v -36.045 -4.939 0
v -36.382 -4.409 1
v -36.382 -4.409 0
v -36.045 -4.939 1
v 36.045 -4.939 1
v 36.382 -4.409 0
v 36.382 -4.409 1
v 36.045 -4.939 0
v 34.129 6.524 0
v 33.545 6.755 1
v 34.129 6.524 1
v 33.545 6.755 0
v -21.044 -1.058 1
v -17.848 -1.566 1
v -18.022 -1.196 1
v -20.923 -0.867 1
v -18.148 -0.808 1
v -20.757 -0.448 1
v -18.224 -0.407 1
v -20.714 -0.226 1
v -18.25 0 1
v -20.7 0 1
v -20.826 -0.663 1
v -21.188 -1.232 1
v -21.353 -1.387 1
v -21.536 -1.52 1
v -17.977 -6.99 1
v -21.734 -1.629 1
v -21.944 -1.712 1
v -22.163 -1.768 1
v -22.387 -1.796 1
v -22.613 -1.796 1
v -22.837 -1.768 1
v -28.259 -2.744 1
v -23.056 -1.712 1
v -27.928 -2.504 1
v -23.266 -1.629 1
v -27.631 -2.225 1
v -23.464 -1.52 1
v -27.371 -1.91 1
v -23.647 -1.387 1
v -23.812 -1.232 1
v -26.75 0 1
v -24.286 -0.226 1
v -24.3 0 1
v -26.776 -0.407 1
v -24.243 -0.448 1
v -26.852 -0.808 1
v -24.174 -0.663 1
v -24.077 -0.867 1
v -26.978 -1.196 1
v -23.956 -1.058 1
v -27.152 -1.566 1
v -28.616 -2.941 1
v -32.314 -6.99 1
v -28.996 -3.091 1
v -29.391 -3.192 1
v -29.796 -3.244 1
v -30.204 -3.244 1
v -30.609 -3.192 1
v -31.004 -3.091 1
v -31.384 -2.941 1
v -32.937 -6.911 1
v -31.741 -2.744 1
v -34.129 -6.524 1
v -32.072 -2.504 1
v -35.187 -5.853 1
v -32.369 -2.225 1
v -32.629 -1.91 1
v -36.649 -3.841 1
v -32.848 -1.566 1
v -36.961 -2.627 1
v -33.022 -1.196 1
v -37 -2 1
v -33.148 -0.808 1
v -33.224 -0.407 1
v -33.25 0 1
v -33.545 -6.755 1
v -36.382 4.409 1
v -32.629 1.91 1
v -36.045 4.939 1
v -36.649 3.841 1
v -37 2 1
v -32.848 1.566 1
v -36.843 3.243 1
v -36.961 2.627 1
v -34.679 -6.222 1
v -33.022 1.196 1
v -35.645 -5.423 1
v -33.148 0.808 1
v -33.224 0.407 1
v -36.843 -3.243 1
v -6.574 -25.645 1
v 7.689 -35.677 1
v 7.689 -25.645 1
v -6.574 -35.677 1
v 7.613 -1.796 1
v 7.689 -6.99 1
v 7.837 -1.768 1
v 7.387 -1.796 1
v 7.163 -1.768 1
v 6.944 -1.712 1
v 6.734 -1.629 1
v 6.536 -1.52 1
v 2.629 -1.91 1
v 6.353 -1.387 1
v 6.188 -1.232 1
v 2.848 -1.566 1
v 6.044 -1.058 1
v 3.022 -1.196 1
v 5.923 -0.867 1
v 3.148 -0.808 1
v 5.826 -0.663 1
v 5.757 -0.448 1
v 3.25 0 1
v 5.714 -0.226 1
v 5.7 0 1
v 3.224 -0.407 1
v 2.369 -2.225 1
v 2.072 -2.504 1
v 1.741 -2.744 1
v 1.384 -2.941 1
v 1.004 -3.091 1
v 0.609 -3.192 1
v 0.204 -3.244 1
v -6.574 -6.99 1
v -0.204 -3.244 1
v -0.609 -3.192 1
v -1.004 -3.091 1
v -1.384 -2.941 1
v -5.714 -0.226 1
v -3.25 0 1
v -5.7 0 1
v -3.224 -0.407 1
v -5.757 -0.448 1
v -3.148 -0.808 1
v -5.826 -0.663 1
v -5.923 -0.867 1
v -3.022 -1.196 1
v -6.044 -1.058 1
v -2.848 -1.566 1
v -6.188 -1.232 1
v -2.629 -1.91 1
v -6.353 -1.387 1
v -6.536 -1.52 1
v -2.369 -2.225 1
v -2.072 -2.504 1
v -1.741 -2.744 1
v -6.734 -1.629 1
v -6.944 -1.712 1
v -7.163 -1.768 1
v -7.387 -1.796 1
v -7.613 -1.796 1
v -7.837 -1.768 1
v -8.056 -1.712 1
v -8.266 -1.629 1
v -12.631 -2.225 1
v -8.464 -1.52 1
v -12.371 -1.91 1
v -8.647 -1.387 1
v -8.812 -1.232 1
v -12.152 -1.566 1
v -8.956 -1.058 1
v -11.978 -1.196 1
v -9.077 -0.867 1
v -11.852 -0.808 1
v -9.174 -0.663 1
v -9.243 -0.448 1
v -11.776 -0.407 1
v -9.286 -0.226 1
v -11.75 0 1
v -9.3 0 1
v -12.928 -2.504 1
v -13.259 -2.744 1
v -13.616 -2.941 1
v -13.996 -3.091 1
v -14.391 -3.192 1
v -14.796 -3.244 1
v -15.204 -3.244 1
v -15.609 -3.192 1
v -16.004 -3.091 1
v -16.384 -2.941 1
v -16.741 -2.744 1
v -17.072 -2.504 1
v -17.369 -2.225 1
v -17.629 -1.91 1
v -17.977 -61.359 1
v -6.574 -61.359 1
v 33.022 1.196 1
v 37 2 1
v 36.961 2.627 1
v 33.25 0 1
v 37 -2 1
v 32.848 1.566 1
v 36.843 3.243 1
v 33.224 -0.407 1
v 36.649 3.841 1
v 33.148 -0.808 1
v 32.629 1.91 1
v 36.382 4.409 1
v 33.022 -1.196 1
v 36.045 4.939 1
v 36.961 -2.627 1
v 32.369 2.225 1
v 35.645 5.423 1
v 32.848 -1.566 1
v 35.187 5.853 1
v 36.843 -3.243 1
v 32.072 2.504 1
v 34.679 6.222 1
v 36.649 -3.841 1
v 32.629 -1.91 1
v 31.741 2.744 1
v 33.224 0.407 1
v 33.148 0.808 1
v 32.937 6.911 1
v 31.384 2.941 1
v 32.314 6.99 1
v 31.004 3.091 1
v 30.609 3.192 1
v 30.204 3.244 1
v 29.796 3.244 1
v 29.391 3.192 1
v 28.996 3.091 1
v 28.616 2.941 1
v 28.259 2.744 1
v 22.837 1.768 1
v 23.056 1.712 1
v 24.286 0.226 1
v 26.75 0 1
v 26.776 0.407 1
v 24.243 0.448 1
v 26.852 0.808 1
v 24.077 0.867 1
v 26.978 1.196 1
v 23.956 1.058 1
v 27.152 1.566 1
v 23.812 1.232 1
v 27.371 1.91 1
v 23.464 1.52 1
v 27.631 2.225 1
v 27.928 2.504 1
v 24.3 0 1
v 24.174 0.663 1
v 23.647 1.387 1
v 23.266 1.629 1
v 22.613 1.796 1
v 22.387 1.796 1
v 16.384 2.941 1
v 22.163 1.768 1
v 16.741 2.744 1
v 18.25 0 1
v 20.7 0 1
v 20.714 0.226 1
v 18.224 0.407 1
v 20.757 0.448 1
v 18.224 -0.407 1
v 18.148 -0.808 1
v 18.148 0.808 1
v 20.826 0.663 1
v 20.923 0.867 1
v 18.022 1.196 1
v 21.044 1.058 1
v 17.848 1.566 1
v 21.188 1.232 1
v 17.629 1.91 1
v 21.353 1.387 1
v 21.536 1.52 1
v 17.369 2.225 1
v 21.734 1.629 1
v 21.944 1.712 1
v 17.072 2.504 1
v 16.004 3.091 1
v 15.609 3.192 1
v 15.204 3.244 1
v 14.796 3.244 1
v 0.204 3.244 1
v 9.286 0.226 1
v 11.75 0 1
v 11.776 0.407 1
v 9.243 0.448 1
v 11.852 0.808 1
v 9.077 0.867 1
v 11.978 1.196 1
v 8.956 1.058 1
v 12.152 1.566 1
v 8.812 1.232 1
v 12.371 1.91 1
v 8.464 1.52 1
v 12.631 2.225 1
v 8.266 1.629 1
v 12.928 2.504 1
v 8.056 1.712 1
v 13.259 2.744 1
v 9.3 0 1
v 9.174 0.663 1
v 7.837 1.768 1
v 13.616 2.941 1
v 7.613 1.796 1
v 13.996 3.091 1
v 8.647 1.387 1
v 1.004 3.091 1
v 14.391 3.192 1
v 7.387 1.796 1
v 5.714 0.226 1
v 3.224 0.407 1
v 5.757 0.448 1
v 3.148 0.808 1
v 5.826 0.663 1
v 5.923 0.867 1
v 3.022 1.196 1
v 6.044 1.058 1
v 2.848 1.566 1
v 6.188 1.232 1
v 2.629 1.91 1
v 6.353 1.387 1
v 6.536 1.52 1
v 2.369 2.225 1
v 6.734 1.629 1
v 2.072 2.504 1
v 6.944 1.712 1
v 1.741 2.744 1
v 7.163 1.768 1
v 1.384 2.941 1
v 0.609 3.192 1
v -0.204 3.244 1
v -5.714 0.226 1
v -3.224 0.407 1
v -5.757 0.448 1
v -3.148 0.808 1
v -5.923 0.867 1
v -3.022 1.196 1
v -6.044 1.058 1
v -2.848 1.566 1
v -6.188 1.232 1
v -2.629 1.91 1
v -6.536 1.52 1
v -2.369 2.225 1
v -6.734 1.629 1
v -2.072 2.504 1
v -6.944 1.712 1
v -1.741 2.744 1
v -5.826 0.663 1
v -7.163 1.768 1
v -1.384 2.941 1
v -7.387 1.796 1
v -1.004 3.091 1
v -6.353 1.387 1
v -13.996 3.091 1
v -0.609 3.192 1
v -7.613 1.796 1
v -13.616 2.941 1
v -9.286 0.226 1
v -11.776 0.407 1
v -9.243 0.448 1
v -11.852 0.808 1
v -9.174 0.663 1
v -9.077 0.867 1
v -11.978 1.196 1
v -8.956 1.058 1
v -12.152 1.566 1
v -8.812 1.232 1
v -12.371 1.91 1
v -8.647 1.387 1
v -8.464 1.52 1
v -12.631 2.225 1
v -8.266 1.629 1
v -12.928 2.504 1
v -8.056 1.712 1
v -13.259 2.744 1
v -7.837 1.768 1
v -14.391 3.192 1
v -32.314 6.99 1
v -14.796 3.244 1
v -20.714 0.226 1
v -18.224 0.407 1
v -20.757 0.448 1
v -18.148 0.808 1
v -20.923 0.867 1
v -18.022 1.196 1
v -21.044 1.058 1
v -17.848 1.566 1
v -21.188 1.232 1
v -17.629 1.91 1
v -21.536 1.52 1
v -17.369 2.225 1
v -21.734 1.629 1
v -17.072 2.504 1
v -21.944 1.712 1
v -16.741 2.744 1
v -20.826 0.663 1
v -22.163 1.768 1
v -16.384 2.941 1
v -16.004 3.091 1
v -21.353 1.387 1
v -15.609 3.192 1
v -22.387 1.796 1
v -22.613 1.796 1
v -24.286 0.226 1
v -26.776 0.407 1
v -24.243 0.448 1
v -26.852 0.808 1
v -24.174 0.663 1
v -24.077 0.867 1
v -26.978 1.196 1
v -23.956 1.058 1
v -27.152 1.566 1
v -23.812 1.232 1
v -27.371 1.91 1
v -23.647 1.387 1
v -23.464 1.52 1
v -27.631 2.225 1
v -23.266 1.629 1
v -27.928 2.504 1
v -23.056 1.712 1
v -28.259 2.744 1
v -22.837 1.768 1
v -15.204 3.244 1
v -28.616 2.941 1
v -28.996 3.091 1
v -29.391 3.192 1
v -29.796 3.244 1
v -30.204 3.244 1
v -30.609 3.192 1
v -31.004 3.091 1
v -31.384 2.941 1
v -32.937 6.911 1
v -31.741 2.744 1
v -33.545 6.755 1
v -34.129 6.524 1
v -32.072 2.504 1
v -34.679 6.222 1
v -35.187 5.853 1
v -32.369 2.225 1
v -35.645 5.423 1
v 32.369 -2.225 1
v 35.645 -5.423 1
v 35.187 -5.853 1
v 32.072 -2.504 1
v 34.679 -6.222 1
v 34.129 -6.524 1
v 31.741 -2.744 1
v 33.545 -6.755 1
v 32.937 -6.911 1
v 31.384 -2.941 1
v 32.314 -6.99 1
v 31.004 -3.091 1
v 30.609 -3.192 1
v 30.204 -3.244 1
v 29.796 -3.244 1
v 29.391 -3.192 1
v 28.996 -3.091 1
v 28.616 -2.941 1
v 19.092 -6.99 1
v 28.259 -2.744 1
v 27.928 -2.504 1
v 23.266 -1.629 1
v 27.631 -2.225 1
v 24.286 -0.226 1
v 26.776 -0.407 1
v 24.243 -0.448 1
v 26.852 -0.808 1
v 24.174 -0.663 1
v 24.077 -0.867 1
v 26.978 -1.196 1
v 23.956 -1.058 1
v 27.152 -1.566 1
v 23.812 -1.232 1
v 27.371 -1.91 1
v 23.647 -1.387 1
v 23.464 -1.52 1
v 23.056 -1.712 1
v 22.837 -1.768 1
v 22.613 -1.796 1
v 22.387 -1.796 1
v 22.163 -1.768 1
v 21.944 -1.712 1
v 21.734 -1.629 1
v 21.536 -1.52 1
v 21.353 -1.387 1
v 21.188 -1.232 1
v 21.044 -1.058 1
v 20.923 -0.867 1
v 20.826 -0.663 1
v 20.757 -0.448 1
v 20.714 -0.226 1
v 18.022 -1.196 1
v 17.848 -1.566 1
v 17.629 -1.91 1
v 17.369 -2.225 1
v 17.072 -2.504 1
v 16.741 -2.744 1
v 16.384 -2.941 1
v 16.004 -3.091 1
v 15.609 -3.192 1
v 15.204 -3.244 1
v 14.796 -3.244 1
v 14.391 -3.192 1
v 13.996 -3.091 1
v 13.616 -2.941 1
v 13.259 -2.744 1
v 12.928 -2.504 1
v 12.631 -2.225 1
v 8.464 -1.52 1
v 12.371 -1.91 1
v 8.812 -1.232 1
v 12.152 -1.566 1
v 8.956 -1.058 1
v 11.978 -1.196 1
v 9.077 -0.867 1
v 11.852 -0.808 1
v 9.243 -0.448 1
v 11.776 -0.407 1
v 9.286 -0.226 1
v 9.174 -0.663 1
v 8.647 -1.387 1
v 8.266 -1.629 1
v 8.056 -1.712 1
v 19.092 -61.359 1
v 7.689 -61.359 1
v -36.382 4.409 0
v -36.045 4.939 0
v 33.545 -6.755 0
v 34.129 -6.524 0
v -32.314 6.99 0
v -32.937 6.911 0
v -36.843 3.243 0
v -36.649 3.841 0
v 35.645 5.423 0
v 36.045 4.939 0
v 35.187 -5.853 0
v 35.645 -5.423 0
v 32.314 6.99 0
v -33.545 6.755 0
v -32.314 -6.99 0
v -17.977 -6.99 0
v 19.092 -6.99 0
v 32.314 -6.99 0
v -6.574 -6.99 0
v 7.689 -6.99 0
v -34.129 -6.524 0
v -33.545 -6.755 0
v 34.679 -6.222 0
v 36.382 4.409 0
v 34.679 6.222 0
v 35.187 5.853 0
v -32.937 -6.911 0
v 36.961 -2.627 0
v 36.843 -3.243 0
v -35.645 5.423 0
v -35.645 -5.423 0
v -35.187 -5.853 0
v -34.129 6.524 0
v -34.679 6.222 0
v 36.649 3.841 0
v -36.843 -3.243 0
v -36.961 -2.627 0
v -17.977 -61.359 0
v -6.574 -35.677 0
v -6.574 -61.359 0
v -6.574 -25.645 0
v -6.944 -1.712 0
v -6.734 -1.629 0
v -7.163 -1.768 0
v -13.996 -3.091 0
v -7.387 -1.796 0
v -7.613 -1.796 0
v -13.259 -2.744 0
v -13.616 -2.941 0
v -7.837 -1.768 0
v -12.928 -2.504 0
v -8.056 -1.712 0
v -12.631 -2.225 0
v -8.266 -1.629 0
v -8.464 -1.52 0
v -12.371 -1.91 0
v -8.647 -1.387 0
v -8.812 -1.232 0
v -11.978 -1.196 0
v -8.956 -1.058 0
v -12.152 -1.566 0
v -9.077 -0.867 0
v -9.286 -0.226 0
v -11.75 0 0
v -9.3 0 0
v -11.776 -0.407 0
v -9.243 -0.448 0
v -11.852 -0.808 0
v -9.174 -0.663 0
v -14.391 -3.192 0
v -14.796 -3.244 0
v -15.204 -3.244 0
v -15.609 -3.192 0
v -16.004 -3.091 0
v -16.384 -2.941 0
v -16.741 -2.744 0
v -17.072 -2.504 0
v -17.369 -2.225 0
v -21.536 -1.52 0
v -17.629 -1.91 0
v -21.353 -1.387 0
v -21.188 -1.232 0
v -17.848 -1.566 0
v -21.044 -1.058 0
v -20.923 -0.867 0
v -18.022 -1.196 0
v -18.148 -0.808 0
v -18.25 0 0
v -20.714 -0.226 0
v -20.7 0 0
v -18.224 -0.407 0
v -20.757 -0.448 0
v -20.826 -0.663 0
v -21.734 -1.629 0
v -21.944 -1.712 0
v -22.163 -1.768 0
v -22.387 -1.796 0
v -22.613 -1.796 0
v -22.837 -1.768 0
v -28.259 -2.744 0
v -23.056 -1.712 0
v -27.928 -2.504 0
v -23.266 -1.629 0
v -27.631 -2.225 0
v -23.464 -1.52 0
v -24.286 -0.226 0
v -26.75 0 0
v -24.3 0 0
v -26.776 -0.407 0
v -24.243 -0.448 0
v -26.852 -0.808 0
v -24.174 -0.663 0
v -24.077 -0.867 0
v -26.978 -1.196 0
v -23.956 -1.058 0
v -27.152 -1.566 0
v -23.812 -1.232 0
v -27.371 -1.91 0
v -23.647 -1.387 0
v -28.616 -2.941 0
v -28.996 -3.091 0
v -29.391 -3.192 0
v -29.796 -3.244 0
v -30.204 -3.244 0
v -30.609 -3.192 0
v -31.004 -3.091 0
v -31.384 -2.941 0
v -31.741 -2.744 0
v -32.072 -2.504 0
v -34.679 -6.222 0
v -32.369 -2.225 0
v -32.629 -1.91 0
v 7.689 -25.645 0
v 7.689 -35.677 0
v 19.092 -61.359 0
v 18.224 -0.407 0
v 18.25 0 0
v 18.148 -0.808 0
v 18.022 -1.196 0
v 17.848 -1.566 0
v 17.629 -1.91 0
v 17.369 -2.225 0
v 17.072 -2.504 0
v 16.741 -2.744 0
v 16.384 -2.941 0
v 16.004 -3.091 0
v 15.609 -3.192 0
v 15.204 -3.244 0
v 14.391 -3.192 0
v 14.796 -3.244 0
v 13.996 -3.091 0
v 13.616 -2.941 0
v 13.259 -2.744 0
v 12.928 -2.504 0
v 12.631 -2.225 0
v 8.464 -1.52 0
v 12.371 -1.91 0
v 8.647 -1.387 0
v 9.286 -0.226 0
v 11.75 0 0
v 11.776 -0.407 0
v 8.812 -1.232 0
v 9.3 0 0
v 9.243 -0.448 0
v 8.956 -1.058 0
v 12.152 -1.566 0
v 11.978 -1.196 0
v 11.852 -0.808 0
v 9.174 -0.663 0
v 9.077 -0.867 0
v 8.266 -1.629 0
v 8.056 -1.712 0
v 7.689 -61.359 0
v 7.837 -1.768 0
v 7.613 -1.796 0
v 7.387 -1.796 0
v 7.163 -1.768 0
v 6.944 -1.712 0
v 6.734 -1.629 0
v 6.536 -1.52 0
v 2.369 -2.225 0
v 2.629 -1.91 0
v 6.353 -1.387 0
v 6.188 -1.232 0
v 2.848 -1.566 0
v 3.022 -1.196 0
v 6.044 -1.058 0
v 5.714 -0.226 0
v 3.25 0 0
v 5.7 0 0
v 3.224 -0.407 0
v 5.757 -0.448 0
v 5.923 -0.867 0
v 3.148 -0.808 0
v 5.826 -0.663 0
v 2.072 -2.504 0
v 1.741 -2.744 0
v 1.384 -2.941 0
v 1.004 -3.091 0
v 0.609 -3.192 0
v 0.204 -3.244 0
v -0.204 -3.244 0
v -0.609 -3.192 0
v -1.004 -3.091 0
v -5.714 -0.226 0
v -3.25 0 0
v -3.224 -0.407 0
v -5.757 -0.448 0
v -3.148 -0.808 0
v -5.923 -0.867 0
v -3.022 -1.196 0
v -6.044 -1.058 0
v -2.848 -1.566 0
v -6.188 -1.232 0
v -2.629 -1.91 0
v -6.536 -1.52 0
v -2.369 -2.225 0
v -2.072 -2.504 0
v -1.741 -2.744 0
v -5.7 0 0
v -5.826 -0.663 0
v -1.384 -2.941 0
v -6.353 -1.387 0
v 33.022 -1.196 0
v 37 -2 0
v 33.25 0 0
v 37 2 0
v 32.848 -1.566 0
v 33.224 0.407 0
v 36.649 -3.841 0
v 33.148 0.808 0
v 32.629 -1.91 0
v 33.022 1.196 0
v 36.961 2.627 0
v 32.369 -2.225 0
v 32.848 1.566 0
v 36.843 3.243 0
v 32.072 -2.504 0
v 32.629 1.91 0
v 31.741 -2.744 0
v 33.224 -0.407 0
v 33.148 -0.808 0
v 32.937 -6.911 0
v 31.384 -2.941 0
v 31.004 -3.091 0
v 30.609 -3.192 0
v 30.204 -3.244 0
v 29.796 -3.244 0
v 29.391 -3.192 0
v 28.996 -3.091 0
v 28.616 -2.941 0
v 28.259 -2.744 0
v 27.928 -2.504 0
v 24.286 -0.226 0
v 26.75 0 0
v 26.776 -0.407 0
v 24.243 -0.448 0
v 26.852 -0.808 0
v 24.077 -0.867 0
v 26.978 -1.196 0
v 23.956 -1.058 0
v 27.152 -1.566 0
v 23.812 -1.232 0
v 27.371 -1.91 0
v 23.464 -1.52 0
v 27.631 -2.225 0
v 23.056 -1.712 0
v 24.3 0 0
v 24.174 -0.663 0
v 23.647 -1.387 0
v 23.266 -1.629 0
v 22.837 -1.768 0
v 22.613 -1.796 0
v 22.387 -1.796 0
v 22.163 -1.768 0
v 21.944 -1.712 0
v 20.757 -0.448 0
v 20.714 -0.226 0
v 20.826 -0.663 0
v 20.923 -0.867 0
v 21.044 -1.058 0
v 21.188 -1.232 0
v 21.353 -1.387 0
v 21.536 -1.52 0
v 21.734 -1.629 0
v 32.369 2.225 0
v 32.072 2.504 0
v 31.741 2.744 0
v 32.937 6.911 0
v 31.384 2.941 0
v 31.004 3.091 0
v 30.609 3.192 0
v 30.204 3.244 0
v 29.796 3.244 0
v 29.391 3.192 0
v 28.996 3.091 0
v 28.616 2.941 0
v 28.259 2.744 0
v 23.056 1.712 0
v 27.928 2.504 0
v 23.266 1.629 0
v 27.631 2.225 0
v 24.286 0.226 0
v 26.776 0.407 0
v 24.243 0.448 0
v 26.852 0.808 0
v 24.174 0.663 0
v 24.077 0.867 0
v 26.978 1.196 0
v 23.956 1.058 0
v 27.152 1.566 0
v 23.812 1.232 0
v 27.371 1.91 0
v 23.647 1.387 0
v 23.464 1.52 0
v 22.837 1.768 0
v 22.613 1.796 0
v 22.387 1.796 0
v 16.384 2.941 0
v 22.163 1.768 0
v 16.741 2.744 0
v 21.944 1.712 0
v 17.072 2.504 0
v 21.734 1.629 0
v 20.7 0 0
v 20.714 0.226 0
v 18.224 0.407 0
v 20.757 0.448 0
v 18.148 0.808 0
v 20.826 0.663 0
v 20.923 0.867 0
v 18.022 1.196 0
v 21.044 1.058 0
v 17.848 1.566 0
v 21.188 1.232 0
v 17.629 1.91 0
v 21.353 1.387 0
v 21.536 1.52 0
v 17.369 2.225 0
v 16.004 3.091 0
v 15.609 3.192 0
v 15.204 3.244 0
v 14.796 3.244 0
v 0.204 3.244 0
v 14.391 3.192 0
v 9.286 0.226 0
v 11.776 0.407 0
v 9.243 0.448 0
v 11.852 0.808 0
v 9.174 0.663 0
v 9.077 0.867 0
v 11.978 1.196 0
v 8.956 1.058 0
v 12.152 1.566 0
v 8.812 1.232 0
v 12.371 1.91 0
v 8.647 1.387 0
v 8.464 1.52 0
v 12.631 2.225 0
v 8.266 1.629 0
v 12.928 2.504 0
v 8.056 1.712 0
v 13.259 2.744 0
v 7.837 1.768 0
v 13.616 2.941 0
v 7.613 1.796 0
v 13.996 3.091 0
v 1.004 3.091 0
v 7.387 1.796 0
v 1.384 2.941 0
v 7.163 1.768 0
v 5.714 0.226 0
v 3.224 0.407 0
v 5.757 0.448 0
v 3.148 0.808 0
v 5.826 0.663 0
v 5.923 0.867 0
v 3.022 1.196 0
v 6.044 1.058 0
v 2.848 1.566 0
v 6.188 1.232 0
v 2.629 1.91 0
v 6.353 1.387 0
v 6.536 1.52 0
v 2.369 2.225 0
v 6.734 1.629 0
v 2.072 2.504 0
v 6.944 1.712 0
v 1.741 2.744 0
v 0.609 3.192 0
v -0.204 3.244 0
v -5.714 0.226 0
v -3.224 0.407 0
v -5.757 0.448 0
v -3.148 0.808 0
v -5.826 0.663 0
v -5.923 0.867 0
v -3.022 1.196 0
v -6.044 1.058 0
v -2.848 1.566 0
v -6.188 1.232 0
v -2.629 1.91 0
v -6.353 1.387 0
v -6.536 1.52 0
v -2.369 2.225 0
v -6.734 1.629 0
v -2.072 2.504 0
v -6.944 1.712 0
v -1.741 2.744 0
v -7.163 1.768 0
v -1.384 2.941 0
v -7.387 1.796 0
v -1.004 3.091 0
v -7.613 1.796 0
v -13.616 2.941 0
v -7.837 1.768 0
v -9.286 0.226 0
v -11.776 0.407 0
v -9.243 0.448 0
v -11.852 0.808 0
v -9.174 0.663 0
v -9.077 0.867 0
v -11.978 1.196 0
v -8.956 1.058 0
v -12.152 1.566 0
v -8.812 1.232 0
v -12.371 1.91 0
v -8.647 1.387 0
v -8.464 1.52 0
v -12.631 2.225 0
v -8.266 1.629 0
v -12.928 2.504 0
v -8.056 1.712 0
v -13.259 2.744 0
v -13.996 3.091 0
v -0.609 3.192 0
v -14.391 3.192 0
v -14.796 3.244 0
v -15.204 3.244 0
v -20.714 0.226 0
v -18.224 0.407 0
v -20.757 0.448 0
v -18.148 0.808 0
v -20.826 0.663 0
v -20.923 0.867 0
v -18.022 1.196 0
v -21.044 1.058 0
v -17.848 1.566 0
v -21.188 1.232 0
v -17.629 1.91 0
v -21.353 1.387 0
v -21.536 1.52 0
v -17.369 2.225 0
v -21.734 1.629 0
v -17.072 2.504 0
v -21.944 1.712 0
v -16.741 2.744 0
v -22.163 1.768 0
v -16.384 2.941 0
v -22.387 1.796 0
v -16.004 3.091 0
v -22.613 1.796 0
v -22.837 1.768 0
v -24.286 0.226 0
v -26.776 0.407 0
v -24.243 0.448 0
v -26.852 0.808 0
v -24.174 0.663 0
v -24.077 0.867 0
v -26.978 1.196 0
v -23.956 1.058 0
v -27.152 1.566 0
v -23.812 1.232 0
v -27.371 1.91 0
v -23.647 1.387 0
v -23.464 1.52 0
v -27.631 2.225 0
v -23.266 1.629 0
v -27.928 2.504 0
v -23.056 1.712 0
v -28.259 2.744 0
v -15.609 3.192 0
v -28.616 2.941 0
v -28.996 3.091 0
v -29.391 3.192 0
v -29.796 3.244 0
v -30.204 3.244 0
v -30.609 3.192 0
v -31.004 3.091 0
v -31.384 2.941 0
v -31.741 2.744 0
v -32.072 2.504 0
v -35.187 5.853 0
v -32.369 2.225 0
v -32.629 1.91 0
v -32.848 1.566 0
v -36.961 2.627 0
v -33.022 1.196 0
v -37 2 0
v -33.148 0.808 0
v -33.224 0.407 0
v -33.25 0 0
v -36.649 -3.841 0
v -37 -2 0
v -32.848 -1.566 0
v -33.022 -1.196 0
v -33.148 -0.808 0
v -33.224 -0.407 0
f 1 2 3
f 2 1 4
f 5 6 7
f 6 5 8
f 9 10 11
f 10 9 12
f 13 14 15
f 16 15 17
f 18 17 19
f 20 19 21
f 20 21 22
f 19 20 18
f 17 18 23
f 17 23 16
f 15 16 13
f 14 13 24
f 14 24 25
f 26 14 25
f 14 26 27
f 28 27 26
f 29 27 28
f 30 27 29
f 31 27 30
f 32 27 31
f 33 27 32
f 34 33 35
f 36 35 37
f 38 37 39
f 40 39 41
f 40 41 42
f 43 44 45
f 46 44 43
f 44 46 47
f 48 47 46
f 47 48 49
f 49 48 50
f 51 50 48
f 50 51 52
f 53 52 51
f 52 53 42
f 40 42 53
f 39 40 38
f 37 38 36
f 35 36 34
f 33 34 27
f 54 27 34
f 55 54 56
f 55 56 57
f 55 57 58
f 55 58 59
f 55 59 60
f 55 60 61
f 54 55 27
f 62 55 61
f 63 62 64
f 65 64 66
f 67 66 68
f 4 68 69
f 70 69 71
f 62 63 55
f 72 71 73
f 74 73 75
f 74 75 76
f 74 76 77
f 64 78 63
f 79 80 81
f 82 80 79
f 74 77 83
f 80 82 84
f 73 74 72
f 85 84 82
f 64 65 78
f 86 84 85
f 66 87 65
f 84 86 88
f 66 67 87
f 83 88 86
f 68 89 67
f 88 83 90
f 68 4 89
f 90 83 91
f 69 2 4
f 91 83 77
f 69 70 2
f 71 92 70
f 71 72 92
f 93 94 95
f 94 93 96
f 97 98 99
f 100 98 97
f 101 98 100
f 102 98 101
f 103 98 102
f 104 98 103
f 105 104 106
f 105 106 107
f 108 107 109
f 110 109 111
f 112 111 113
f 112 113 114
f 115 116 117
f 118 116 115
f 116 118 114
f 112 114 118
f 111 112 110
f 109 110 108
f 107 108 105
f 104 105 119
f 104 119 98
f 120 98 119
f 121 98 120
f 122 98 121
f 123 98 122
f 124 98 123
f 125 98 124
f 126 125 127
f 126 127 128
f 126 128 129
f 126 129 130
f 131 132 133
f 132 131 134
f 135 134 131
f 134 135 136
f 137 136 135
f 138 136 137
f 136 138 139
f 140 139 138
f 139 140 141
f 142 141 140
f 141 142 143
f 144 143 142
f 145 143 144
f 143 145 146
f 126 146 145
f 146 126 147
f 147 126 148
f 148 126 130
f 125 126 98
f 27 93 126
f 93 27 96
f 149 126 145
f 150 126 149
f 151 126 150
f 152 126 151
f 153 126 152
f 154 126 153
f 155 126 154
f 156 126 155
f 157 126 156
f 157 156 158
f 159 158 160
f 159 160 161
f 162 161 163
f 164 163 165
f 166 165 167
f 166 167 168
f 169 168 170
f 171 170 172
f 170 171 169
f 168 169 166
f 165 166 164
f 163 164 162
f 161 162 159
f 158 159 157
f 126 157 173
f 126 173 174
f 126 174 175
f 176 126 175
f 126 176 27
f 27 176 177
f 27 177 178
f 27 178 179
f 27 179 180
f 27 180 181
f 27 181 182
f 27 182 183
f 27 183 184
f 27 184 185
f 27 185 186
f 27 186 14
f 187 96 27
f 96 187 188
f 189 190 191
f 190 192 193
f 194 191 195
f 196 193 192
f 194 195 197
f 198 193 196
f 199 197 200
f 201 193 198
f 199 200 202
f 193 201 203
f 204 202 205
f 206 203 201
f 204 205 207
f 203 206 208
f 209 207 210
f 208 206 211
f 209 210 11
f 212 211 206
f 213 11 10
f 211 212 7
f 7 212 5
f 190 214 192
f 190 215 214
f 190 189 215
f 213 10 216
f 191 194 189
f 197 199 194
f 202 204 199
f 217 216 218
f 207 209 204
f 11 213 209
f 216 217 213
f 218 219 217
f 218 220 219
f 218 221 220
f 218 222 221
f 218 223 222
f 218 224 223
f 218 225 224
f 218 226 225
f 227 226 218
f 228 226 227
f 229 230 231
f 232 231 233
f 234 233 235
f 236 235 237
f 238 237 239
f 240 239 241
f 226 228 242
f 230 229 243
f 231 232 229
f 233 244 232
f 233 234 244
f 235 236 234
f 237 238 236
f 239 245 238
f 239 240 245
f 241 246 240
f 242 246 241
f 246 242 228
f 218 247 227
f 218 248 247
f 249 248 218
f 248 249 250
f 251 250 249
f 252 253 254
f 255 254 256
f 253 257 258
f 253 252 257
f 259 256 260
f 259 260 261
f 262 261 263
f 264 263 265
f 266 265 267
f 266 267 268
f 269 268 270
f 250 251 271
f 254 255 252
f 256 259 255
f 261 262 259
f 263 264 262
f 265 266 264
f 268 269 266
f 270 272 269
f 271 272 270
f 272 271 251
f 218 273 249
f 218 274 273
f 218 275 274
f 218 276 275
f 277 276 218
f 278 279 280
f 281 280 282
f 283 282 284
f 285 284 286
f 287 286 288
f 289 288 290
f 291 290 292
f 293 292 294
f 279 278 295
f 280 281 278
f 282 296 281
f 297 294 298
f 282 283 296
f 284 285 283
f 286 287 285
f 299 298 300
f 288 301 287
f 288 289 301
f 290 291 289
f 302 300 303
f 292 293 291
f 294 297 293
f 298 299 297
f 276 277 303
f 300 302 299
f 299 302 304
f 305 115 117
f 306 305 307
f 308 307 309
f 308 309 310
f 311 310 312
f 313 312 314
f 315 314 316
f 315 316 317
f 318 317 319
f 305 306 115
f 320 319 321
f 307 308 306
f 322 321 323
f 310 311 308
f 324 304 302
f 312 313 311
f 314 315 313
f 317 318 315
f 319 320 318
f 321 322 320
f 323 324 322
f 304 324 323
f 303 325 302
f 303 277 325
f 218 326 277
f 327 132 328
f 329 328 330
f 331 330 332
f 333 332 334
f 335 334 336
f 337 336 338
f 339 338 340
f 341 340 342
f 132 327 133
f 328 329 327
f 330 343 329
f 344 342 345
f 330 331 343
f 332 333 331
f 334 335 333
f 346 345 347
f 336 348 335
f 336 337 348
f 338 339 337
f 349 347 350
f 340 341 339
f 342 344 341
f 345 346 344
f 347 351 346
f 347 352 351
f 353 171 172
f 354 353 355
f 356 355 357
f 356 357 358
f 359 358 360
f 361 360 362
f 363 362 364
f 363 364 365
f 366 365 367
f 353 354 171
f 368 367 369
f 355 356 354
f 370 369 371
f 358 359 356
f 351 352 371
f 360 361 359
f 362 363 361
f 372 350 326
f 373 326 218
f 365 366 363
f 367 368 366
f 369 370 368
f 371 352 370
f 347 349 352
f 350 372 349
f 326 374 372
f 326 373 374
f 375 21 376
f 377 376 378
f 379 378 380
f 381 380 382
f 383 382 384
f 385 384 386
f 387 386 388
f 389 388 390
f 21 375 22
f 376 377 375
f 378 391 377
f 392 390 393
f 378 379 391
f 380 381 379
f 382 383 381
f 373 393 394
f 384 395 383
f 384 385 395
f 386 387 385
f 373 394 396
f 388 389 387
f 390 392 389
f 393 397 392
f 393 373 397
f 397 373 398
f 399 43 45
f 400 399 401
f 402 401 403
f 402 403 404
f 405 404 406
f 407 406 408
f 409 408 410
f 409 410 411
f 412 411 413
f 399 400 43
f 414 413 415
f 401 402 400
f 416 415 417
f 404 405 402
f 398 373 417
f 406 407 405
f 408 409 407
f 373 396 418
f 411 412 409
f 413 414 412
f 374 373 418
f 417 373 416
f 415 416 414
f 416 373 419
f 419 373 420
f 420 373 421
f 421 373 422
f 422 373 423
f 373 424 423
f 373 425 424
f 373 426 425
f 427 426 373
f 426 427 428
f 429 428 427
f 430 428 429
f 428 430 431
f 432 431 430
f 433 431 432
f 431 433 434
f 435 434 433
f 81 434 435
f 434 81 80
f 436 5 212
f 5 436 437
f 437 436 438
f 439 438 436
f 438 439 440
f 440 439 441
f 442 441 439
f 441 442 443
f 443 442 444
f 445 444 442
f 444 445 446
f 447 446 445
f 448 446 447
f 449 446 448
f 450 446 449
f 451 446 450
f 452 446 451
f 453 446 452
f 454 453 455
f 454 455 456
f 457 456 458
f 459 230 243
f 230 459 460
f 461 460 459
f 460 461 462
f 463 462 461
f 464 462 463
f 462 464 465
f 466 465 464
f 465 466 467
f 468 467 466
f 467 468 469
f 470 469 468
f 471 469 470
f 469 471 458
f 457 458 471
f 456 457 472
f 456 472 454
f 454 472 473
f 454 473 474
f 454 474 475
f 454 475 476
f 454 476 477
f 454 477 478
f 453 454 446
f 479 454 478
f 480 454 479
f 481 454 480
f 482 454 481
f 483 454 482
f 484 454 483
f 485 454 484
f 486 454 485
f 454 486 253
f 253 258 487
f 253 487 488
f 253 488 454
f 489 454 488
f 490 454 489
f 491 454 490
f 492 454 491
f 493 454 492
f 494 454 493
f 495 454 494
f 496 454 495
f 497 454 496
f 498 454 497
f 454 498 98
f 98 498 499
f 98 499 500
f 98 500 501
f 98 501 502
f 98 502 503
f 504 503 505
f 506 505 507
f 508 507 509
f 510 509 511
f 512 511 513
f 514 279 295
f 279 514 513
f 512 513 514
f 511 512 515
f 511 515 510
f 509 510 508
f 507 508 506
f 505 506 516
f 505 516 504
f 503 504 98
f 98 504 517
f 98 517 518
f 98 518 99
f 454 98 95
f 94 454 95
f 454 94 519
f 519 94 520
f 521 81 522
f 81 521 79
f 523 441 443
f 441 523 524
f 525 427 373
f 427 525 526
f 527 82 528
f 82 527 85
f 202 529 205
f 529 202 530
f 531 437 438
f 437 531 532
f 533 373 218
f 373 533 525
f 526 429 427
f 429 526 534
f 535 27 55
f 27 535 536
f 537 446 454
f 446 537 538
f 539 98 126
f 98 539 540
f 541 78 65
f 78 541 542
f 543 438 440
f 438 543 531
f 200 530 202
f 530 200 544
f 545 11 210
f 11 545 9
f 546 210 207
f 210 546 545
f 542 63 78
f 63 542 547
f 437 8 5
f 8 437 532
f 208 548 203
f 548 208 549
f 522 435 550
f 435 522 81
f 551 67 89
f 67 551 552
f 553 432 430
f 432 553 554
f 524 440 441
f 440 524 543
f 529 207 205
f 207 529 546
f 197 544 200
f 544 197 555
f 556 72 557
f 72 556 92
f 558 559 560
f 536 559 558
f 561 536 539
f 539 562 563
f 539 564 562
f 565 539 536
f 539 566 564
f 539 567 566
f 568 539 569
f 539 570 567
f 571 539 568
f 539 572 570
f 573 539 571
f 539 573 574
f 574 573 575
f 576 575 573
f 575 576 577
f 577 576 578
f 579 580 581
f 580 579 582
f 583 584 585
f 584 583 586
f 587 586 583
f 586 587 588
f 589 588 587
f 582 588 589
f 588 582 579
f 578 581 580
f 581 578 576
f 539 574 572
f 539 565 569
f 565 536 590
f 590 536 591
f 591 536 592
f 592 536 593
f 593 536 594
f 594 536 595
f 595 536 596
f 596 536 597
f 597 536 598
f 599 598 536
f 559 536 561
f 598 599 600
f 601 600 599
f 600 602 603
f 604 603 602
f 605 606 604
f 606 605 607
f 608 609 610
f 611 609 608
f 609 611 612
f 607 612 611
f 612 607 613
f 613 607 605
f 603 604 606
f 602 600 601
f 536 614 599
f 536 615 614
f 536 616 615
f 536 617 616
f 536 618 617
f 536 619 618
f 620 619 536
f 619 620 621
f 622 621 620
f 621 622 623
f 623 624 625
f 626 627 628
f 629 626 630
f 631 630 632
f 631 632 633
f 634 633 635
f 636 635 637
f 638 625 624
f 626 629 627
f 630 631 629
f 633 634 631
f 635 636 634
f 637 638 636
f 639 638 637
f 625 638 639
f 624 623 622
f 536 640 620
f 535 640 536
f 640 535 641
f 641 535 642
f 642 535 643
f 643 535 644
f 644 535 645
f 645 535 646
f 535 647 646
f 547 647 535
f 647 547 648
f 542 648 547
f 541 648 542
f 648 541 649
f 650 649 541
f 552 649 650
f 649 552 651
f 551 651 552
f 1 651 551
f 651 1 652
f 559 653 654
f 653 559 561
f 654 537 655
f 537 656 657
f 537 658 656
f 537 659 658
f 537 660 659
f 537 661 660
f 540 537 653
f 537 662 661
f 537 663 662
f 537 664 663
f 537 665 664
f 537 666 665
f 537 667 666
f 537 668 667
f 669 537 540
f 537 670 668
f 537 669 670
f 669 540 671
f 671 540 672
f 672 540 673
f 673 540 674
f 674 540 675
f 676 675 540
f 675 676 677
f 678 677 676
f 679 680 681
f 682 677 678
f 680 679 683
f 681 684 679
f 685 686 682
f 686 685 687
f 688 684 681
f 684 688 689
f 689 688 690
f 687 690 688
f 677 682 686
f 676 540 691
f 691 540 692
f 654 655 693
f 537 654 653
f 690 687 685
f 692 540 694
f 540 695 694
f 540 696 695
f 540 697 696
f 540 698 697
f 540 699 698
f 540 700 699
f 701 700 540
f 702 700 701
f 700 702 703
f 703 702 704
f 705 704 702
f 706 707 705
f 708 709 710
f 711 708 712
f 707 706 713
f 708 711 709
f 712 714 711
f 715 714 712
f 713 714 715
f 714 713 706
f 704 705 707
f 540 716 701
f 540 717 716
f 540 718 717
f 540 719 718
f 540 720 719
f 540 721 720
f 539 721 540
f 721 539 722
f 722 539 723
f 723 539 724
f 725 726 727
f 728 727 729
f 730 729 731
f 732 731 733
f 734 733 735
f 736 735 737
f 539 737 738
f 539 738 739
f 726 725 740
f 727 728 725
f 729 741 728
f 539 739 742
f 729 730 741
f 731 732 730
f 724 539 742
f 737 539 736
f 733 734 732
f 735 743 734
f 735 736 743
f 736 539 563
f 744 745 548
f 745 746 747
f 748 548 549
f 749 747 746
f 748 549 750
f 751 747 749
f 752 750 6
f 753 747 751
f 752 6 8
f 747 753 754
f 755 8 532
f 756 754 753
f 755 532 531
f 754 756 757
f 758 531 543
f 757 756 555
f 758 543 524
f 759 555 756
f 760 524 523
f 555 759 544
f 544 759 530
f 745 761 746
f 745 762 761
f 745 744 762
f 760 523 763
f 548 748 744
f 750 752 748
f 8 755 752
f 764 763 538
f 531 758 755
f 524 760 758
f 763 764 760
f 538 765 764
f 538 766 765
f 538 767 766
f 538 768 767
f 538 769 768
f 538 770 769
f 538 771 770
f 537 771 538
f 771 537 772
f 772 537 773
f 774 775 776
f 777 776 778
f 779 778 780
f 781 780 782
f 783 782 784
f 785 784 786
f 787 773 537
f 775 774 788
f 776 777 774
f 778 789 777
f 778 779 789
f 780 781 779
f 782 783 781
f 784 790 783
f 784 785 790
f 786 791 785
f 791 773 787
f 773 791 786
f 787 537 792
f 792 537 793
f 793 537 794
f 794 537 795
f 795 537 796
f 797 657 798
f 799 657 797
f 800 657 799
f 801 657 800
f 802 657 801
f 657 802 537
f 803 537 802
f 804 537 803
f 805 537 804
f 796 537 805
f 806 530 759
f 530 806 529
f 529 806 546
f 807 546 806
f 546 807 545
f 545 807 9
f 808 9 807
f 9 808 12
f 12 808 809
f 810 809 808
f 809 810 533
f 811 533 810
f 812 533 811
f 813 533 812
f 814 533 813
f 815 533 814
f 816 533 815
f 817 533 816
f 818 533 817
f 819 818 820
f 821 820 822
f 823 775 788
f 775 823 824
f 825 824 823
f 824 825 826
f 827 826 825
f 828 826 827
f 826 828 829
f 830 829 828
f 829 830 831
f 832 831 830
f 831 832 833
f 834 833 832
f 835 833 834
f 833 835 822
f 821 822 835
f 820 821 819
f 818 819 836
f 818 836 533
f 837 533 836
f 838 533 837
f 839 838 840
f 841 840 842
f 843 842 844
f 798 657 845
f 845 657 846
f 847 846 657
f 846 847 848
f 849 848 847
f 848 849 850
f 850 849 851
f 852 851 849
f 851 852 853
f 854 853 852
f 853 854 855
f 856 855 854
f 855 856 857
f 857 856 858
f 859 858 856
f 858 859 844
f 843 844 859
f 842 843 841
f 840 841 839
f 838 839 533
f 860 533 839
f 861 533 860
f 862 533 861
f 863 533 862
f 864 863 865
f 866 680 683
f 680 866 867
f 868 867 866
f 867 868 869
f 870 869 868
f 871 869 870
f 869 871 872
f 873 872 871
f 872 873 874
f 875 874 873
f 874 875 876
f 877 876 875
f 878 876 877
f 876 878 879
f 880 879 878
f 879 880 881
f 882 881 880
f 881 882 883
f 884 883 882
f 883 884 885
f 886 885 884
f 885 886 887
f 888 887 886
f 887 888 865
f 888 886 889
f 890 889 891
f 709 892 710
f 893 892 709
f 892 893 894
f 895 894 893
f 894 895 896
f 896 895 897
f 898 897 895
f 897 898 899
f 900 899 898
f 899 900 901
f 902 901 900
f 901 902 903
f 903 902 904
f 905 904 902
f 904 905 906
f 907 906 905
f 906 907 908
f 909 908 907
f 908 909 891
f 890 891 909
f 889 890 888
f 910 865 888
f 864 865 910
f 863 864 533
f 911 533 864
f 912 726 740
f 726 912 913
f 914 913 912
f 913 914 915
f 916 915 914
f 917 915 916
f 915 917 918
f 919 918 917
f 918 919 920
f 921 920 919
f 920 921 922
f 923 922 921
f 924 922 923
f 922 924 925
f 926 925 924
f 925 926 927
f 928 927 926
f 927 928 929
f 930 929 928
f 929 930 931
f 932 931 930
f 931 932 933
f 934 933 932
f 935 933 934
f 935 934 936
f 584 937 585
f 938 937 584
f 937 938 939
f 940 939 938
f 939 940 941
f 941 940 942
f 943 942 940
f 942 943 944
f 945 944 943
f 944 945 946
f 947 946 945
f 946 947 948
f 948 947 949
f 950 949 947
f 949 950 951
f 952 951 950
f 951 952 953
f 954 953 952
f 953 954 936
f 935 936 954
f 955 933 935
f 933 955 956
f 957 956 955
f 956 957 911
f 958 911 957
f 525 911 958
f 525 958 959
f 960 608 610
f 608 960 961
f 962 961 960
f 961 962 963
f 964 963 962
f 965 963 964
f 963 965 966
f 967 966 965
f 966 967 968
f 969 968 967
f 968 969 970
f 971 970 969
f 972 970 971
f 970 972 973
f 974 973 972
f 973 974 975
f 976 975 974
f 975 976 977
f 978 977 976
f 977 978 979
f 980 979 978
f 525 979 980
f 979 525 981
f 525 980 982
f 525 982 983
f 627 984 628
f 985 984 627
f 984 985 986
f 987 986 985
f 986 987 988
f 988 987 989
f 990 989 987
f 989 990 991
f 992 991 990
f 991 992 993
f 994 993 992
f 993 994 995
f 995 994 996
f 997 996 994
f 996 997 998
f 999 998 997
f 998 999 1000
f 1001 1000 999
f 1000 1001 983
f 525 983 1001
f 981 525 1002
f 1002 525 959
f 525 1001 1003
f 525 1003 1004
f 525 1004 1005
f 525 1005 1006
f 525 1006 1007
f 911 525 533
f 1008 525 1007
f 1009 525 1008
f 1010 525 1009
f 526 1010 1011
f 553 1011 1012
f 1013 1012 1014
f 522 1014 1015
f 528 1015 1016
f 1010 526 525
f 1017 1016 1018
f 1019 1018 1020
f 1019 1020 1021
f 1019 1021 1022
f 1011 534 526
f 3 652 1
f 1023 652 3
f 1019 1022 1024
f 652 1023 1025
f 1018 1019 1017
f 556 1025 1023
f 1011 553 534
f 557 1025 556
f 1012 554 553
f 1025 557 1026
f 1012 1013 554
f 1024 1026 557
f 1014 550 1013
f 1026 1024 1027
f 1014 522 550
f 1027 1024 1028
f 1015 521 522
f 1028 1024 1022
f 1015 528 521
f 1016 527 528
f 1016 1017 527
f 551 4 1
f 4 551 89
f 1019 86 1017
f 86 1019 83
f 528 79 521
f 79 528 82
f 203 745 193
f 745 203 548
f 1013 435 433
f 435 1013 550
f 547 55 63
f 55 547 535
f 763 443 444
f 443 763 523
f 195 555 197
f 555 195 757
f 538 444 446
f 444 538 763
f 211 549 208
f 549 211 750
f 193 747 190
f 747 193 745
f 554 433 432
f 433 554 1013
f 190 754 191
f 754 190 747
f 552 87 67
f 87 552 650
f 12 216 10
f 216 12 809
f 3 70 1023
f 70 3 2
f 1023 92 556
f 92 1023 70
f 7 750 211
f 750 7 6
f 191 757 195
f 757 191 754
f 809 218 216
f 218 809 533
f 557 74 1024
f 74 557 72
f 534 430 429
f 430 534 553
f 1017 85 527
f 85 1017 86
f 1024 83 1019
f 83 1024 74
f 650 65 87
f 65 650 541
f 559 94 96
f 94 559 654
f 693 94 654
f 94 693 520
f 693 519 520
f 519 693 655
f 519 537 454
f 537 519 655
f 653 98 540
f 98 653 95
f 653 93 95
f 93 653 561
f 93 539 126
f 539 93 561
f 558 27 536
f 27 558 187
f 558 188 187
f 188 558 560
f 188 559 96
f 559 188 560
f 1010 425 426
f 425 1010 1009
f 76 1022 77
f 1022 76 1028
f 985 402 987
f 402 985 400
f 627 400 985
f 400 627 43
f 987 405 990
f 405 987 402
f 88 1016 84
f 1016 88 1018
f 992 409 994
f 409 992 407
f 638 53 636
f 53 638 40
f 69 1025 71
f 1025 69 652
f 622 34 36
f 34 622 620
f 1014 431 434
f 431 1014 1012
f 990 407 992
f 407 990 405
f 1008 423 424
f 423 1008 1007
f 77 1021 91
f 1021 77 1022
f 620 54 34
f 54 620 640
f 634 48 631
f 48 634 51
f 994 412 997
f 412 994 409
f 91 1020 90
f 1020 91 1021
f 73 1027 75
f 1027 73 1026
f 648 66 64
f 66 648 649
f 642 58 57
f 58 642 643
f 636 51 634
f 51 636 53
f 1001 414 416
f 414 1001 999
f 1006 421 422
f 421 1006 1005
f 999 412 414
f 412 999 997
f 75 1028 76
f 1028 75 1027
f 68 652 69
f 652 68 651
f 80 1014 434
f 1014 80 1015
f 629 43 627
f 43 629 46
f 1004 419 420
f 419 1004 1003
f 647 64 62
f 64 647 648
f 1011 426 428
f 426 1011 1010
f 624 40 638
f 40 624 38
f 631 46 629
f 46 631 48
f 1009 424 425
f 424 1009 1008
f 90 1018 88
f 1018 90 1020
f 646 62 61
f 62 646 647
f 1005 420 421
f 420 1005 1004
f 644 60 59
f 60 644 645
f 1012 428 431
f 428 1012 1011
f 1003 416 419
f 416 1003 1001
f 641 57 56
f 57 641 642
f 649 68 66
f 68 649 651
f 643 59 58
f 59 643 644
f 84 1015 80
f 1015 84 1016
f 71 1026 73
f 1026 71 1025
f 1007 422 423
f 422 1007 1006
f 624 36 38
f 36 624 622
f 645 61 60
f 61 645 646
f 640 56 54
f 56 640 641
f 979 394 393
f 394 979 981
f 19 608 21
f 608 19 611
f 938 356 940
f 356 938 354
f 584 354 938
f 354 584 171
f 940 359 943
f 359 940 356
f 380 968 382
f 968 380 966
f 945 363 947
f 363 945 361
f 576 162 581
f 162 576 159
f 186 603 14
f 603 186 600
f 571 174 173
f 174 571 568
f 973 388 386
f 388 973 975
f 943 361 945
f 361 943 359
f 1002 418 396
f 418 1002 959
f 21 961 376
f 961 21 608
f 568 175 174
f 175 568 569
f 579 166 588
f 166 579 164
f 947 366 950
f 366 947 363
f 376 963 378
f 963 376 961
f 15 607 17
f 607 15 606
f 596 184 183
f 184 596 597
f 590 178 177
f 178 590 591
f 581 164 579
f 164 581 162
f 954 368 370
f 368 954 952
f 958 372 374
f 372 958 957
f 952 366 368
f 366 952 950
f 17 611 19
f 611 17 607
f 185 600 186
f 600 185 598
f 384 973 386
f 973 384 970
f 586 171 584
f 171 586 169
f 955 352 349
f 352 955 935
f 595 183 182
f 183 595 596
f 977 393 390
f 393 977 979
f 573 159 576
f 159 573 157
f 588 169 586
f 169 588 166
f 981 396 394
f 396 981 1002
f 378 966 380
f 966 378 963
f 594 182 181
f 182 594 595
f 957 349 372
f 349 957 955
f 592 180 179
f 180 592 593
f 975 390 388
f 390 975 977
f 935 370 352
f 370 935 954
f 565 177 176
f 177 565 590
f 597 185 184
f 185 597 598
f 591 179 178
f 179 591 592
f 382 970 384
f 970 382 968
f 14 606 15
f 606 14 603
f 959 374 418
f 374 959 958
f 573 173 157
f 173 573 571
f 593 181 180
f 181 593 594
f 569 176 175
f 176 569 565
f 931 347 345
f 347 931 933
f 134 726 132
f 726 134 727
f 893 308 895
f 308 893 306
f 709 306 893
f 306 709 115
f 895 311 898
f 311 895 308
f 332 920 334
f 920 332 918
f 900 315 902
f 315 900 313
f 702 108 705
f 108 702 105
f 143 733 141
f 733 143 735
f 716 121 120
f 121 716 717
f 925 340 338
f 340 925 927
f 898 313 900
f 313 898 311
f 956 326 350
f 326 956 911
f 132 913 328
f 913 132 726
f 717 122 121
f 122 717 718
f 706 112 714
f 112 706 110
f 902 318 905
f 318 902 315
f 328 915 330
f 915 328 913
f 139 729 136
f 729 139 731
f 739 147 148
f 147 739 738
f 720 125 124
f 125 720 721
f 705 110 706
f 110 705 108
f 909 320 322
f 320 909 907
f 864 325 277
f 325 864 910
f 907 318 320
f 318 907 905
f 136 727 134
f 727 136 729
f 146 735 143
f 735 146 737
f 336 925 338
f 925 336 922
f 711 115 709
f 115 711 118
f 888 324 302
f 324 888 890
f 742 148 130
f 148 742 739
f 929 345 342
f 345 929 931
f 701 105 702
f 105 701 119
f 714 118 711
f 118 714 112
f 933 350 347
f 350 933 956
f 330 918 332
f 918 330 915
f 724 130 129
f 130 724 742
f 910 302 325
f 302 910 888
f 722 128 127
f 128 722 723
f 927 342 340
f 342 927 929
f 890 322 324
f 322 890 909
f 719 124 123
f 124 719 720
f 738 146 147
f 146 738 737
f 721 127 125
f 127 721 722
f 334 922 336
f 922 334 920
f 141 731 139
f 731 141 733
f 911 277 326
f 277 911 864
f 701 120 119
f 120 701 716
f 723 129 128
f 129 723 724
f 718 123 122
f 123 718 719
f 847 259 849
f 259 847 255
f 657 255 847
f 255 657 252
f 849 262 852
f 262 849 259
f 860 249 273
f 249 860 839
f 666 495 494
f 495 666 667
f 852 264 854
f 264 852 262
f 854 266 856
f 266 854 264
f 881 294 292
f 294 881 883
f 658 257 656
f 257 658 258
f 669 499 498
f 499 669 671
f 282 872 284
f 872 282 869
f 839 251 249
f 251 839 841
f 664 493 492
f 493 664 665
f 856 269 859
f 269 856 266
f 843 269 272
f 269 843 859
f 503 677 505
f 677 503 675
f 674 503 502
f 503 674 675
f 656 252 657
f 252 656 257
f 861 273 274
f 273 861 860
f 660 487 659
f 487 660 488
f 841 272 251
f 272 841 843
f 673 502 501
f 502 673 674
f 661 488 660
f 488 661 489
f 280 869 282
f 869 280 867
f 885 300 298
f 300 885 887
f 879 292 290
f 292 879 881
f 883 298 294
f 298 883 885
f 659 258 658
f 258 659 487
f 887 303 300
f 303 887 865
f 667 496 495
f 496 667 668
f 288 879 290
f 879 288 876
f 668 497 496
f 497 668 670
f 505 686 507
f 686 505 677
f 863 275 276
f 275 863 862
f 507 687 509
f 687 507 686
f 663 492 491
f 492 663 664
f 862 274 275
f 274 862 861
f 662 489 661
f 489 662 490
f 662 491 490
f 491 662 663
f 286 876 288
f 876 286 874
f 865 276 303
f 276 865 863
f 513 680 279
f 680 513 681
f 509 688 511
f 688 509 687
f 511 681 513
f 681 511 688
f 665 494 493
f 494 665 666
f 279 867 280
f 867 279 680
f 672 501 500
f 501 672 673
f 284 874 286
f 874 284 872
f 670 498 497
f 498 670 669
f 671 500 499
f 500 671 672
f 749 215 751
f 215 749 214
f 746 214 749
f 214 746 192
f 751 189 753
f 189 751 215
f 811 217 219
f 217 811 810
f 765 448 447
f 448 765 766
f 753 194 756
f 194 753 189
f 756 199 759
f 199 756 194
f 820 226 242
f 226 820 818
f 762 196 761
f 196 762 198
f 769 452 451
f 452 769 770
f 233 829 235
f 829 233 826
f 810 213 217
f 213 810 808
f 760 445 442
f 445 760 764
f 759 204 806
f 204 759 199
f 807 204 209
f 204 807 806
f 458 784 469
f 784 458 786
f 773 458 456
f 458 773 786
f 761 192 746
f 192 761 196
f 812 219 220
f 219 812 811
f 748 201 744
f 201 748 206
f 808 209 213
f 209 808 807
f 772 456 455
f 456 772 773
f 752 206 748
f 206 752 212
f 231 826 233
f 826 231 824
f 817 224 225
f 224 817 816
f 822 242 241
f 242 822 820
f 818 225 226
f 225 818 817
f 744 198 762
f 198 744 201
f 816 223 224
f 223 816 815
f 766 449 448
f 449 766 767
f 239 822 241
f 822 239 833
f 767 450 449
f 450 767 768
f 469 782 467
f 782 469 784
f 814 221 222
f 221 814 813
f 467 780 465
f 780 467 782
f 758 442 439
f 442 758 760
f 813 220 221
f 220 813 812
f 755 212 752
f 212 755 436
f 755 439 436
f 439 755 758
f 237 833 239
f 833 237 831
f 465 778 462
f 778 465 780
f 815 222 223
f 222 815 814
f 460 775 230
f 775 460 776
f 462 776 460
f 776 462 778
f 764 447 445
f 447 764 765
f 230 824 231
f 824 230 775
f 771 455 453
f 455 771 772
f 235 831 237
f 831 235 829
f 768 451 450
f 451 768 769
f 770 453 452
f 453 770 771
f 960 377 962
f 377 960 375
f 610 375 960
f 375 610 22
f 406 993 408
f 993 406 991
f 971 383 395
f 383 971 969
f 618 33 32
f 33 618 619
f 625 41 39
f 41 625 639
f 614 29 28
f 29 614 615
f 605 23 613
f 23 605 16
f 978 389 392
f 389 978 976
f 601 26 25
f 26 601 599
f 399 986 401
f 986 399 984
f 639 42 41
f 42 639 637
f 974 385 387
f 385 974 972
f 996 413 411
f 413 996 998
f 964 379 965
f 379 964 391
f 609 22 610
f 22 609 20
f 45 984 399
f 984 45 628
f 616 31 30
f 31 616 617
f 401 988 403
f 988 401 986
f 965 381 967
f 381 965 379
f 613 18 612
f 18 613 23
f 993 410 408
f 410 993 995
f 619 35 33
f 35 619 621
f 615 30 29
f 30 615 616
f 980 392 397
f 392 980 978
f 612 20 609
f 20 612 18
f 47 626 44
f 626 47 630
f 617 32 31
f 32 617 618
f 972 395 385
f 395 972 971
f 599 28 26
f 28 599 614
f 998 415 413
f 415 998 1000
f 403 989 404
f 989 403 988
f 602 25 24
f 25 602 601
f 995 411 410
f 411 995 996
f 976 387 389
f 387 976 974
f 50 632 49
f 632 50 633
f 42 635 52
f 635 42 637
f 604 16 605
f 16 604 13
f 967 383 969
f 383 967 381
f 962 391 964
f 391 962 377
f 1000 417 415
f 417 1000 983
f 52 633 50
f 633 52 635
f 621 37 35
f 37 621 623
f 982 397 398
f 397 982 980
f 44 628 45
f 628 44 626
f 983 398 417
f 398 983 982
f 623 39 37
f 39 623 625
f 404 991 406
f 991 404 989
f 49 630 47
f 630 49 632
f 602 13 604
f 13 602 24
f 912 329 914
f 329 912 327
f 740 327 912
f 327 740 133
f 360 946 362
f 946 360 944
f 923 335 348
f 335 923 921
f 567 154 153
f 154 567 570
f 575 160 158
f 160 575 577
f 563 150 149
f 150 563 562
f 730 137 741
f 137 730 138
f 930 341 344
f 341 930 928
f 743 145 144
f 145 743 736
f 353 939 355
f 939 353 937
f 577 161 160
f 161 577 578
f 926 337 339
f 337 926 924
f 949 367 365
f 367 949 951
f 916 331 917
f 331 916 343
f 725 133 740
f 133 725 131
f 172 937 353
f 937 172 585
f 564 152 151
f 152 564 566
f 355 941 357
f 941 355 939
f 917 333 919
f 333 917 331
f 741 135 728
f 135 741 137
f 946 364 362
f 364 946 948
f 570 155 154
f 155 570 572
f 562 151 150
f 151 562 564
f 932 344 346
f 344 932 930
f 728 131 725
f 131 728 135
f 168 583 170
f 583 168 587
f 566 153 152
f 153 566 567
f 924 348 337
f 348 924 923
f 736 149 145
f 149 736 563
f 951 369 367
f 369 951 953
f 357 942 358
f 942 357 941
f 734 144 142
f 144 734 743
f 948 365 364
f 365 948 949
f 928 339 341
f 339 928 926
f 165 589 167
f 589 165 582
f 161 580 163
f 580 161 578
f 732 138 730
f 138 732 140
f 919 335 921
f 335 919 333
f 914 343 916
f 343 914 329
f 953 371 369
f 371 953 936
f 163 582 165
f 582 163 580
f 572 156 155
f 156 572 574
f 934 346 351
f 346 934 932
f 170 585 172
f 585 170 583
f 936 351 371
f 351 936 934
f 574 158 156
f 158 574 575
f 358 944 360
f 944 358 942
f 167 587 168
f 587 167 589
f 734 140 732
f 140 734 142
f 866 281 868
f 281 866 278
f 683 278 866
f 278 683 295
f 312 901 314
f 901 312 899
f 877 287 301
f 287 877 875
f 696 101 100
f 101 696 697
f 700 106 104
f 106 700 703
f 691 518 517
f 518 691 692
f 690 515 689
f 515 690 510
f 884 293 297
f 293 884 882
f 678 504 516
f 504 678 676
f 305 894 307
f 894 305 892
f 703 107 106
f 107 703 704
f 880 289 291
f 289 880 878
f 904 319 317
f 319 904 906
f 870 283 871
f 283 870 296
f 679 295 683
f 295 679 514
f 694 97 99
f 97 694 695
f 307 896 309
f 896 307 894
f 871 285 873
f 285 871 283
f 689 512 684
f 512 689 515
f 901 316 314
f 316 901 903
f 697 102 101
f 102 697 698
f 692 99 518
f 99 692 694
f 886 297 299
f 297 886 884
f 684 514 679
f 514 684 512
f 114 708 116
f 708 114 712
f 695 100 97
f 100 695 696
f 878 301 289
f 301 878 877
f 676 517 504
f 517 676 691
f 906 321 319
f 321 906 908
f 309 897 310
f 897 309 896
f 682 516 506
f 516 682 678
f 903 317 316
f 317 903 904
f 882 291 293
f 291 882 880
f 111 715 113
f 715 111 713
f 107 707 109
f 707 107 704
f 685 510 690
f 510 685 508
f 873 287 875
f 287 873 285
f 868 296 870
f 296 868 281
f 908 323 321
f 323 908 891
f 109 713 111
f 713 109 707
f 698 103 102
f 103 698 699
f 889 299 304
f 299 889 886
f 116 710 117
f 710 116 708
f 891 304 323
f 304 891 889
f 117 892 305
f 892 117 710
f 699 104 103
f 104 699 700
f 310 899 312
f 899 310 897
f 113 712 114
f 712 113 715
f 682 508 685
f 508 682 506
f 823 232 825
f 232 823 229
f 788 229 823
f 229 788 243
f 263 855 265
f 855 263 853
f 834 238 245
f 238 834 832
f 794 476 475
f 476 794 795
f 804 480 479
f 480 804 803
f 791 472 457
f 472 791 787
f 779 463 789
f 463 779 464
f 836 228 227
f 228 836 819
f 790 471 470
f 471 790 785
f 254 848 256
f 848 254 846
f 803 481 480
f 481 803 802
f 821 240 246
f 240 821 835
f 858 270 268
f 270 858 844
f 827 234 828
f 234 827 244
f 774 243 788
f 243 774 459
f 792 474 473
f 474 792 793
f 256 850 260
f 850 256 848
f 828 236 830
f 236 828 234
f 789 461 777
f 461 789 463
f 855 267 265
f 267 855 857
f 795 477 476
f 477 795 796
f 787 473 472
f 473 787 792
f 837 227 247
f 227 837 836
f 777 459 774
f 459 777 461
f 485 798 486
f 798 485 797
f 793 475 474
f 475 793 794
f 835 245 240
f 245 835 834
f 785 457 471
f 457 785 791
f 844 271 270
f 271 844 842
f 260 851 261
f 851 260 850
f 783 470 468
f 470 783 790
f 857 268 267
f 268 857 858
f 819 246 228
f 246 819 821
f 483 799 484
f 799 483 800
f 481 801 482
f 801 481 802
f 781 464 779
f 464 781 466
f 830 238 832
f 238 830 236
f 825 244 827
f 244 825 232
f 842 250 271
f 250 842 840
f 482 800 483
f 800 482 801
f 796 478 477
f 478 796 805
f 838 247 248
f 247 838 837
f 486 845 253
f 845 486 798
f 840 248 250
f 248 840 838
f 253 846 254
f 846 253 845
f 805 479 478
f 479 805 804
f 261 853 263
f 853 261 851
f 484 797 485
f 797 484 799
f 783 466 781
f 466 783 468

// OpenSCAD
$fn = 50;


difference() {
	union() {
		hull() {
			translate(v = [-32.0000000000, 2.0000000000, 0]) {
				cylinder(h = 1, r = 5);
			}
			translate(v = [32.0000000000, 2.0000000000, 0]) {
				cylinder(h = 1, r = 5);
			}
			translate(v = [-32.0000000000, -2.0000000000, 0]) {
				cylinder(h = 1, r = 5);
			}
			translate(v = [32.0000000000, -2.0000000000, 0]) {
				cylinder(h = 1, r = 5);
			}
		}
		translate(v = [0, -5, 0]) {
			linear_extrude(height = 1) {
				text(font = "DejaVu Sans Mono:style=Bold", halign = "center", size = 57.0000000000, text = "H", valign = "top");
			}
		}
	}
	union() {
		translate(v = [-30.0000000000, 0.0000000000, 0]) {
			translate(v = [0, 0, -100]) {
				cylinder(h = 200, r = 3.2500000000);
			}
		}
		translate(v = [-15.0000000000, 0.0000000000, 0]) {
			translate(v = [0, 0, -100]) {
				cylinder(h = 200, r = 3.2500000000);
			}
		}
		translate(v = [0, 0, -100]) {
			cylinder(h = 200, r = 3.2500000000);
		}
		translate(v = [15.0000000000, 0.0000000000, 0]) {
			translate(v = [0, 0, -100]) {
				cylinder(h = 200, r = 3.2500000000);
			}
		}
		translate(v = [30.0000000000, 0.0000000000, 0]) {
			translate(v = [0, 0, -100]) {
				cylinder(h = 200, r = 3.2500000000);
			}
		}
		translate(v = [-30.0000000000, 0.0000000000, 0]) {
			translate(v = [0, 0, -100]) {
				cylinder(h = 200, r = 1.8000000000);
			}
		}
		translate(v = [-22.5000000000, 0.0000000000, 0]) {
			translate(v = [0, 0, -100]) {
				cylinder(h = 200, r = 1.8000000000);
			}
		}
		translate(v = [-15.0000000000, 0.0000000000, 0]) {
			translate(v = [0, 0, -100]) {
				cylinder(h = 200, r = 1.8000000000);
			}
		}
		translate(v = [-7.5000000000, 0.0000000000, 0]) {
			translate(v = [0, 0, -100]) {
				cylinder(h = 200, r = 1.8000000000);
			}
		}
		translate(v = [0, 0, -100]) {
			cylinder(h = 200, r = 1.8000000000);
		}
		translate(v = [7.5000000000, 0.0000000000, 0]) {
			translate(v = [0, 0, -100]) {
				cylinder(h = 200, r = 1.8000000000);
			}
		}
		translate(v = [15.0000000000, 0.0000000000, 0]) {
			translate(v = [0, 0, -100]) {
				cylinder(h = 200, r = 1.8000000000);
			}
		}
		translate(v = [22.5000000000, 0.0000000000, 0]) {
			translate(v = [0, 0, -100]) {
				cylinder(h = 200, r = 1.8000000000);
			}
		}
		translate(v = [30.0000000000, 0.0000000000, 0]) {
			translate(v = [0, 0, -100]) {
				cylinder(h = 200, r = 1.8000000000);
			}
		}
	}
}
